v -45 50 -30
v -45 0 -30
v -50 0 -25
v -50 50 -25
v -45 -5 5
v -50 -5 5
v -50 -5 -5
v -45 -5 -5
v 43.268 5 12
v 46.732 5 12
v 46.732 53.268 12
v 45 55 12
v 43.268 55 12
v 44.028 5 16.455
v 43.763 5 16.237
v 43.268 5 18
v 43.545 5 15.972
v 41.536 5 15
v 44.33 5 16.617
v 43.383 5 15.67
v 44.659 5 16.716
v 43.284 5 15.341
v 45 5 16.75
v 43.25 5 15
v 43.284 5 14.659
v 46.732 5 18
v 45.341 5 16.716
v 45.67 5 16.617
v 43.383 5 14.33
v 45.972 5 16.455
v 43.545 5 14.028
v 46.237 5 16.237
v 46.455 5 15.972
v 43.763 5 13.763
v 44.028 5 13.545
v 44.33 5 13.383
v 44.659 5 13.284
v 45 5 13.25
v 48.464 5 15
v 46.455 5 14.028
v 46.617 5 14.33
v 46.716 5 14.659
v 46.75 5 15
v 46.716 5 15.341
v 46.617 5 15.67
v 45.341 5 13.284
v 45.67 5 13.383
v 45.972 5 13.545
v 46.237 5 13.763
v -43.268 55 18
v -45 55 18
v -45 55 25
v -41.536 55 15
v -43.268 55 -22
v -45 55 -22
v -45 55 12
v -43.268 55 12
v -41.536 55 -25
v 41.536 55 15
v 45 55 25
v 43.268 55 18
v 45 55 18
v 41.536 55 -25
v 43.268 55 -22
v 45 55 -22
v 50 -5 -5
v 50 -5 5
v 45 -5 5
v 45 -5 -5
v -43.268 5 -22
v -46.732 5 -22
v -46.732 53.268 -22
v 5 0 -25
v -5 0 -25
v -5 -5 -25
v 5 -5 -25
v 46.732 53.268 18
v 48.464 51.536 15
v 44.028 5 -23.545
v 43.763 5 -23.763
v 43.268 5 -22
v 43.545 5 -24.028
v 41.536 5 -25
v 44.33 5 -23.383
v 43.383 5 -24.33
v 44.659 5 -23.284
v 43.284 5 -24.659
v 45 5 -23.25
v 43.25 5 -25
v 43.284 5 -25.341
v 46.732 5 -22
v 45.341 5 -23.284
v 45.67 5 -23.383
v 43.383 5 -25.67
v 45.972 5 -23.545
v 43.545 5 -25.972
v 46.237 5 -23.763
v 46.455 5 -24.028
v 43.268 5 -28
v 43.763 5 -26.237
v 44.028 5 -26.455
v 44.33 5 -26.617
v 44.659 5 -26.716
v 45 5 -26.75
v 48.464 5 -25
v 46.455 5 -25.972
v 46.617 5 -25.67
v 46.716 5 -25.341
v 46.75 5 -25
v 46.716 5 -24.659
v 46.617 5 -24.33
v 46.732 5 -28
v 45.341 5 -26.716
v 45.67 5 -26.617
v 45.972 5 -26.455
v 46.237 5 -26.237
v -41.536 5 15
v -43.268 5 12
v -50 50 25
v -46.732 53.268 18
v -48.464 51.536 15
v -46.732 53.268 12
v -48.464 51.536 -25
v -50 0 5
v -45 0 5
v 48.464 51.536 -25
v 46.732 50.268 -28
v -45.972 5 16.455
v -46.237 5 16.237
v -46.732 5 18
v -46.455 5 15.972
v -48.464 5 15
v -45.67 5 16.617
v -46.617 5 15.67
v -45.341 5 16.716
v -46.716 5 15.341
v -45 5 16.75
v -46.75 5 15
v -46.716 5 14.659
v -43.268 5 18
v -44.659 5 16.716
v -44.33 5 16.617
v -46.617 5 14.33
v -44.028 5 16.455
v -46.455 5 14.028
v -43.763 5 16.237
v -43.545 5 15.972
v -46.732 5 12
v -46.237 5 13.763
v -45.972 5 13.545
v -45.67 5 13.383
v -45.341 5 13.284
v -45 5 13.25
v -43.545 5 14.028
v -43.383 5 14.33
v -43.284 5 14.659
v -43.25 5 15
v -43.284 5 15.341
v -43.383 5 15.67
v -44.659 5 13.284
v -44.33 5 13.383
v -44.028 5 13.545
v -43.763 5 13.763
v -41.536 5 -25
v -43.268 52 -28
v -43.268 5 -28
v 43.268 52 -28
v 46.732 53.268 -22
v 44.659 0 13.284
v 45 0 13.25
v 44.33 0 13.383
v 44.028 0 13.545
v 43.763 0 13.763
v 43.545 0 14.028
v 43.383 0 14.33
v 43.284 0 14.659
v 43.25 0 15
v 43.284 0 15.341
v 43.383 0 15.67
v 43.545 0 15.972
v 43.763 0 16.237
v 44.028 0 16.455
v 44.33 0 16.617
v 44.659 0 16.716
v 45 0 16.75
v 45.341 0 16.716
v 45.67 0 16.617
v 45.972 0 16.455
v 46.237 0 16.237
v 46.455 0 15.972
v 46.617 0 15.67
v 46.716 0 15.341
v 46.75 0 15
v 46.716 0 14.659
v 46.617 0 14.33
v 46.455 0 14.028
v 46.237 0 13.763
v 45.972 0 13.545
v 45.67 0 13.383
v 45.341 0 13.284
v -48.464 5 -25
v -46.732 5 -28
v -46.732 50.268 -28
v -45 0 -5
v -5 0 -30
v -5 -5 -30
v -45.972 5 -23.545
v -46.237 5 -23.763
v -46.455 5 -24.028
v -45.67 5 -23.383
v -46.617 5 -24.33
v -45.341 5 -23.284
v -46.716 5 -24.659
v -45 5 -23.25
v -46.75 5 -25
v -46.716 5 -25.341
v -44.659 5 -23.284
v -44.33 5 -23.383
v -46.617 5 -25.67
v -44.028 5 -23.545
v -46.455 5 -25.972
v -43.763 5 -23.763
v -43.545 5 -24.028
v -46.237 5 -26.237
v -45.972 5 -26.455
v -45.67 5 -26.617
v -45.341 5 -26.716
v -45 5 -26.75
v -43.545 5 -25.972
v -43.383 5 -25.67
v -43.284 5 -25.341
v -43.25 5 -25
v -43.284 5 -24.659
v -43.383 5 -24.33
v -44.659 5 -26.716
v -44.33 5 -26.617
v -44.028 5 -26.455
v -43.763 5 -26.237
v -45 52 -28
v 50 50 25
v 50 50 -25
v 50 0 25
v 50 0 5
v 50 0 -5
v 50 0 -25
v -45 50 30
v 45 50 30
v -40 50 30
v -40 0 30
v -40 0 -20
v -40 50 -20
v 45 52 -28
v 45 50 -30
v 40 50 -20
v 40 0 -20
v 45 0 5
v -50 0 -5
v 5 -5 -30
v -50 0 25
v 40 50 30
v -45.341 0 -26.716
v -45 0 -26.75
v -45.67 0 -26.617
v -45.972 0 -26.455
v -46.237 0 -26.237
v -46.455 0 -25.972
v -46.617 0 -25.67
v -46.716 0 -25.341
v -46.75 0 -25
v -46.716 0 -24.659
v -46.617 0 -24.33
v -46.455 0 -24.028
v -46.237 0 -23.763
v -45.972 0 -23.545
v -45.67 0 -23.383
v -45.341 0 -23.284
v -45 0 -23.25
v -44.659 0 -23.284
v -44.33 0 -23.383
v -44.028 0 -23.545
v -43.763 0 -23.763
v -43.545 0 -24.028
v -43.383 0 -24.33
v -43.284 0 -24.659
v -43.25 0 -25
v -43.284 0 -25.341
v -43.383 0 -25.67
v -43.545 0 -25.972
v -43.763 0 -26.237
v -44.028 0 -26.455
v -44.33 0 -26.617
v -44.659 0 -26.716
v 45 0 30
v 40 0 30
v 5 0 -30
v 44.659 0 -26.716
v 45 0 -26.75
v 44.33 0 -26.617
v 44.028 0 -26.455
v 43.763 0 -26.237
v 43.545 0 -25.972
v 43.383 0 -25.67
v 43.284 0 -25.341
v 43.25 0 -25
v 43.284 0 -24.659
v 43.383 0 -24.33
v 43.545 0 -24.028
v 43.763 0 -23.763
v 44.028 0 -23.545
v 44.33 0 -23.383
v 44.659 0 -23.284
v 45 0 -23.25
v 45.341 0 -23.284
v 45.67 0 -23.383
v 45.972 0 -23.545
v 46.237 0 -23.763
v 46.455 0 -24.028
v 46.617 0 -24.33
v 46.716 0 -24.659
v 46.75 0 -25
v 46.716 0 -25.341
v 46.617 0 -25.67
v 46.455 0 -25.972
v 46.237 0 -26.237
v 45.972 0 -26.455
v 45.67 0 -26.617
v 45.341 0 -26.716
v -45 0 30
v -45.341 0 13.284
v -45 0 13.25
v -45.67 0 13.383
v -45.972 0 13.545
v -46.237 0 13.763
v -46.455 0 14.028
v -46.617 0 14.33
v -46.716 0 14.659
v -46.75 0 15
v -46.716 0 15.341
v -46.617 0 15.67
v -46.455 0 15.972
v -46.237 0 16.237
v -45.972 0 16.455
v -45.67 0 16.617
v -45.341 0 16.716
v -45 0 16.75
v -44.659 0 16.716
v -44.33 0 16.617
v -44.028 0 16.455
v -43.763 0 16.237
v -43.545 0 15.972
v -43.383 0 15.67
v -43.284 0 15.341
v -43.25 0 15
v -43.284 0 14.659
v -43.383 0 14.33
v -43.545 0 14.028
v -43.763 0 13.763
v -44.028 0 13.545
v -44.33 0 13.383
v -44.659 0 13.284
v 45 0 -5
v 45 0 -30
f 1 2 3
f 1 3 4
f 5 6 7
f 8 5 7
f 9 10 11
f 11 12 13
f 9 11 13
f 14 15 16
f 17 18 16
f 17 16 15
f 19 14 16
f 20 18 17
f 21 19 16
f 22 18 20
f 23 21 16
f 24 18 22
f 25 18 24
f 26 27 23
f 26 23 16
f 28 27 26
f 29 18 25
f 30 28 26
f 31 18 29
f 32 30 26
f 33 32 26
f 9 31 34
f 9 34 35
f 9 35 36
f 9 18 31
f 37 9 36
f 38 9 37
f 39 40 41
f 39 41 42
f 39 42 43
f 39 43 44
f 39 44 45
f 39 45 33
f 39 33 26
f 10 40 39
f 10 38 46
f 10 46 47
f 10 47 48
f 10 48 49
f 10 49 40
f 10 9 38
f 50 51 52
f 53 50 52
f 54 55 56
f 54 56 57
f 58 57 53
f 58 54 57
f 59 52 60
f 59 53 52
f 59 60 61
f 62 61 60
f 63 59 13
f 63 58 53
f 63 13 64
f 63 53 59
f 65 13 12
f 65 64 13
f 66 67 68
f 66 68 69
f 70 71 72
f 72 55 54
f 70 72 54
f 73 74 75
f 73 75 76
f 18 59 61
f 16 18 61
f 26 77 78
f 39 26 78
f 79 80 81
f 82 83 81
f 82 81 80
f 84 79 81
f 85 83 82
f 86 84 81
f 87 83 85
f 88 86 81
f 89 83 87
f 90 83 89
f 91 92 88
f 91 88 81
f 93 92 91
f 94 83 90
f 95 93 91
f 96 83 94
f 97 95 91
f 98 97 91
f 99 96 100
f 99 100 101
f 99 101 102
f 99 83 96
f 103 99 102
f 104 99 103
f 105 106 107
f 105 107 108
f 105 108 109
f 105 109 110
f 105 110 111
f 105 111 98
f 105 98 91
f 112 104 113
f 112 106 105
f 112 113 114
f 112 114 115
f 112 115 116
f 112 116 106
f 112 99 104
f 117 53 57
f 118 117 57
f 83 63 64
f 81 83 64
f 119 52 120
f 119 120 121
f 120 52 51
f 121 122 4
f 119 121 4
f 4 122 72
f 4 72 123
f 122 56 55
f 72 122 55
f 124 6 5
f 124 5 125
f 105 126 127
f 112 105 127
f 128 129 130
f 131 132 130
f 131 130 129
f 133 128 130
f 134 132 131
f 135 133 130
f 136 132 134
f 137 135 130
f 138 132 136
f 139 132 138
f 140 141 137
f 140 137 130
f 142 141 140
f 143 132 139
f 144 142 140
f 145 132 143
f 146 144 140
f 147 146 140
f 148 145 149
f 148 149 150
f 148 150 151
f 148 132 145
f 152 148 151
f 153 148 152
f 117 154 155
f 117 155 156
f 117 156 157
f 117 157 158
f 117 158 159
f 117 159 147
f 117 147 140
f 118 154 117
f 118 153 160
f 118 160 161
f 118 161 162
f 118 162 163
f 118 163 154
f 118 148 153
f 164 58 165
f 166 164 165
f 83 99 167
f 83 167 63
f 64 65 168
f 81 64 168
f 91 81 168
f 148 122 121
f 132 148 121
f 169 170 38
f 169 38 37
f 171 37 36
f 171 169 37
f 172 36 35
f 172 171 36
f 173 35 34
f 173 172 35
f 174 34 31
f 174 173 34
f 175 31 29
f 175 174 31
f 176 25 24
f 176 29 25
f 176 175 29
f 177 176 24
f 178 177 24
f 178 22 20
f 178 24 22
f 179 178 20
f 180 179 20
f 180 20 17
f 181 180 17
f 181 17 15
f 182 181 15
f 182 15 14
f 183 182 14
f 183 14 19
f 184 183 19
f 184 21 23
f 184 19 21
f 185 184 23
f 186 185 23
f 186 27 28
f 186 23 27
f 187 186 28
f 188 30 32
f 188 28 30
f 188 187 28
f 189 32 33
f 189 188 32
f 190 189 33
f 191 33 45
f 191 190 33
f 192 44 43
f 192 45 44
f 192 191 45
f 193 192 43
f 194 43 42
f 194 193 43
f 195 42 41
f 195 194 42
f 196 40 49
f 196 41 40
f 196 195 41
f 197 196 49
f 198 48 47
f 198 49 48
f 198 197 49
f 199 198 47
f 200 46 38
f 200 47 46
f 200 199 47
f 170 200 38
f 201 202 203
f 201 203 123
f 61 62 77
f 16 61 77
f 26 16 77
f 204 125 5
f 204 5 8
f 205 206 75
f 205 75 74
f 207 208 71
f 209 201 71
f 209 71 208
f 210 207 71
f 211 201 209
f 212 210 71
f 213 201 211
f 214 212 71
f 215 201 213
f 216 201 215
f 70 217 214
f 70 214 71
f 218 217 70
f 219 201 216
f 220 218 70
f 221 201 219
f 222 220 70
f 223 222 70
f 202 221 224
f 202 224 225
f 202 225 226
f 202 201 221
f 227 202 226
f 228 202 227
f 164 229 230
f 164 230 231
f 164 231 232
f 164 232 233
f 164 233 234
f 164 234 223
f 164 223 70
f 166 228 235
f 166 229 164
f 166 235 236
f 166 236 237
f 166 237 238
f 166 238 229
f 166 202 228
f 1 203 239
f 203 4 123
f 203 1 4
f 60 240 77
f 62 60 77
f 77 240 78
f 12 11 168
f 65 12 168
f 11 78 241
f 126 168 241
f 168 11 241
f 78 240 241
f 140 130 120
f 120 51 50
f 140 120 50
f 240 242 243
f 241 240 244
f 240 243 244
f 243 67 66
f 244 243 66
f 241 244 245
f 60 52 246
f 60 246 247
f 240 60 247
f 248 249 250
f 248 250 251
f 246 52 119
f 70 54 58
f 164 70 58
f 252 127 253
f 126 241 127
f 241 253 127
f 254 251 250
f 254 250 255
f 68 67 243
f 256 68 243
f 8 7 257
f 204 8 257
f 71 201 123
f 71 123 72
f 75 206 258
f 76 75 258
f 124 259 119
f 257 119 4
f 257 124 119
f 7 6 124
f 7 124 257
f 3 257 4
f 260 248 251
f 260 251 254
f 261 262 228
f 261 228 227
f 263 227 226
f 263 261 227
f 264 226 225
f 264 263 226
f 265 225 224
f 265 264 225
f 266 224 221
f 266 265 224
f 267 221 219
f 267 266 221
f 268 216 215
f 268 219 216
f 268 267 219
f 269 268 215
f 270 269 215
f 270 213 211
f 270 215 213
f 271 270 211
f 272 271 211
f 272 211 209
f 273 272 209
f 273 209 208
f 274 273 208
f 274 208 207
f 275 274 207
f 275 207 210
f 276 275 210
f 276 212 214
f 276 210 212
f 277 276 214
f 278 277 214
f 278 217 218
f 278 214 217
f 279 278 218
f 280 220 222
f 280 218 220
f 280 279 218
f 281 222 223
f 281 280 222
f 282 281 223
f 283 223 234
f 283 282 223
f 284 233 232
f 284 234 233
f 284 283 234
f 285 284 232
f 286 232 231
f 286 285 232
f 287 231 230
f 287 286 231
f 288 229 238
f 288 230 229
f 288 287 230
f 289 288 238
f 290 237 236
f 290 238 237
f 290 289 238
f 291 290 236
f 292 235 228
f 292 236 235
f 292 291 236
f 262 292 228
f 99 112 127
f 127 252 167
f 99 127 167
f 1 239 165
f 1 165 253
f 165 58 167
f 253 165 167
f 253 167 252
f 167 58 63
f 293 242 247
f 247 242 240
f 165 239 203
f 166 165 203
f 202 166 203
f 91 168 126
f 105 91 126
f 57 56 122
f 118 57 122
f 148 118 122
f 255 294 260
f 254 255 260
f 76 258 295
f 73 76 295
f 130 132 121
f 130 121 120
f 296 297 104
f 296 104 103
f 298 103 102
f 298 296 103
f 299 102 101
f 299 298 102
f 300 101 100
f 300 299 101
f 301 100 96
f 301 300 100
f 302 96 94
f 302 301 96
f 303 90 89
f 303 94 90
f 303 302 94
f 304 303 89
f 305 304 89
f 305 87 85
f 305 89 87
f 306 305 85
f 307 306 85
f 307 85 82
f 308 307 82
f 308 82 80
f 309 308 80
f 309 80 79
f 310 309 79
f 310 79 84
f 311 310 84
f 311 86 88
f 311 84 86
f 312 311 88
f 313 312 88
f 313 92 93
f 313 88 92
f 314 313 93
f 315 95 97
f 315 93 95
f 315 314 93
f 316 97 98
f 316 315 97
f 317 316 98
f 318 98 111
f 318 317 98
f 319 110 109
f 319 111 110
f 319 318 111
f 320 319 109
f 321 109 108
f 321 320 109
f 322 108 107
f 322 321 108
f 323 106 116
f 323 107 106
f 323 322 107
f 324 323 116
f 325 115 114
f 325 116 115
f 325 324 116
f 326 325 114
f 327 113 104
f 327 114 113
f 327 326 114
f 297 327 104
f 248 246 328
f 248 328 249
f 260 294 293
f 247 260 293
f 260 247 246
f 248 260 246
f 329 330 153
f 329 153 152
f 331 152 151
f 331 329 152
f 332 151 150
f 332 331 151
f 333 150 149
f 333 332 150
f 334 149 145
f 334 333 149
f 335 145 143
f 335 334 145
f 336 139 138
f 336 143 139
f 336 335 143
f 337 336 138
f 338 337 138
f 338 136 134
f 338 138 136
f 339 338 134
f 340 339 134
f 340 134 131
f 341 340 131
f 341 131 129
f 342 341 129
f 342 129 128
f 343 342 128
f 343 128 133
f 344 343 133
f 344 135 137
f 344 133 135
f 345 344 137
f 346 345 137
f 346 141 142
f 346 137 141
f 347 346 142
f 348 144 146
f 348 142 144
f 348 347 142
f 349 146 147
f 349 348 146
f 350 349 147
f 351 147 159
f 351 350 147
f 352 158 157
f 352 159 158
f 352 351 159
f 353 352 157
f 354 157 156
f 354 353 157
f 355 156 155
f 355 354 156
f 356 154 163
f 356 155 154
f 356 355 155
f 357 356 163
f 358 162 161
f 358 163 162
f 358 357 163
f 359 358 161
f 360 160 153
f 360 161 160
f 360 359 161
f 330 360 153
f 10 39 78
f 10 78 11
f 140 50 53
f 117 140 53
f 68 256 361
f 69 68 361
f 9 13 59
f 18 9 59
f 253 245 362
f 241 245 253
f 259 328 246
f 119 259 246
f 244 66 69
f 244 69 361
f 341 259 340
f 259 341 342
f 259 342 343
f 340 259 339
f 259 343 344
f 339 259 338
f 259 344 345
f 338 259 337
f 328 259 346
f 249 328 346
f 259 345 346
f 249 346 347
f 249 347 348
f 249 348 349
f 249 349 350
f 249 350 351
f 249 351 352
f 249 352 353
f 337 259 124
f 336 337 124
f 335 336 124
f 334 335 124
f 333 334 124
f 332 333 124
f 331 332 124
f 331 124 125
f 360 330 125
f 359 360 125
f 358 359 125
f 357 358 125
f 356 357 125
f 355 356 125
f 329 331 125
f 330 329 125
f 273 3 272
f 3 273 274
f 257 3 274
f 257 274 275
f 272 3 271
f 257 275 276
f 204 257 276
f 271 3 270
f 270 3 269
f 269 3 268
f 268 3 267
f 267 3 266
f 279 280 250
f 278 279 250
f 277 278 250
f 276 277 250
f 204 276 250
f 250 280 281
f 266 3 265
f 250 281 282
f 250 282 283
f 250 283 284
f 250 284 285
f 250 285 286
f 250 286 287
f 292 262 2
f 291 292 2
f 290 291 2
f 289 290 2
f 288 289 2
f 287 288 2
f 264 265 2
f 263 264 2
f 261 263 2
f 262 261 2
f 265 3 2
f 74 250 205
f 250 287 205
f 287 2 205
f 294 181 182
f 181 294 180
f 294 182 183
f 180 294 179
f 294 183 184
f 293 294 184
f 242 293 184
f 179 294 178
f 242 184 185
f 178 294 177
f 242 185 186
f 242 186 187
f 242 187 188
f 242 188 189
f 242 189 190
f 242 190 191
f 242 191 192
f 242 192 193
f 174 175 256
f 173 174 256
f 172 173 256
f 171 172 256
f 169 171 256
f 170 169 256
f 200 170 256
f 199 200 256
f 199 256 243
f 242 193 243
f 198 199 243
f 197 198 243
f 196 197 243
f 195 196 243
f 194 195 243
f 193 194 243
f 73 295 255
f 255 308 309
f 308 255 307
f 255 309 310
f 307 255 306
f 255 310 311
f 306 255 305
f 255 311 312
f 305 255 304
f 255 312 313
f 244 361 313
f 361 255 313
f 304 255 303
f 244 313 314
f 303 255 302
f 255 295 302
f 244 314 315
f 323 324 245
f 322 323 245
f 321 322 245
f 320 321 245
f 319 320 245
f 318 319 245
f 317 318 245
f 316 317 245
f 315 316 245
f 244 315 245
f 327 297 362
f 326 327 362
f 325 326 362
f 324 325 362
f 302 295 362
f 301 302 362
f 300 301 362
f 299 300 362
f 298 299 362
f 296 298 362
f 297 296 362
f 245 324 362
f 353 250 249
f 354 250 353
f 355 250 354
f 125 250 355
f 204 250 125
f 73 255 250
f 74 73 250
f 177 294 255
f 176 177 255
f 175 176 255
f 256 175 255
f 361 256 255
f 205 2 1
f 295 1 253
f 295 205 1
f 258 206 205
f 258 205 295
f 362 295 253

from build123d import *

# Parameters (mm, degrees)
SKETCH1_W               = 100
SKETCH1_H               = 60
BOSS_EXTRUDE1_DEPTH     = 55
CUT_EXTRUDE1_START      = 30
SKETCH2_W               = 80
SKETCH2_H               = 50
CUT_EXTRUDE1_DEPTH      = 50
CHAMFER2_SIZE           = 5
CUT_EXTRUDE2_DEPTH      = 81.156097709
CUT_EXTRUDE2_DEPTH_BACK = 81.156097709
SKETCH3_R               = 1.75
CUT_EXTRUDE3_START      = 55
CUT_EXTRUDE3_DEPTH      = 50
BOSS_EXTRUDE2_START     = -50
SKETCH5_W               = 10
SKETCH5_H               = 5
BOSS_EXTRUDE2_DEPTH     = 5
BOSS_EXTRUDE3_START     = 50
SKETCH5_2_W             = 10
SKETCH5_2_H             = 5
BOSS_EXTRUDE3_DEPTH     = 5
BOSS_EXTRUDE4_START     = -30
SKETCH7_W               = 10
SKETCH7_H               = 5
BOSS_EXTRUDE4_DEPTH     = 5


with BuildPart() as part:
    # Sketch1 → Boss-Extrude1 (new body)
    with BuildSketch(Plane(origin=(0, 0, 0), x_dir=(1, 0, 0), z_dir=(0, 1, 0))):
        Rectangle(SKETCH1_W, SKETCH1_H)
    extrude(amount=BOSS_EXTRUDE1_DEPTH)

    # Sketch2 → Cut-Extrude1 (cut)
    with BuildSketch(Plane.XY.offset(CUT_EXTRUDE1_START)):
        with Locations((0, 25)):
            Rectangle(SKETCH2_W, SKETCH2_H)
    extrude(amount=-CUT_EXTRUDE1_DEPTH, mode=Mode.SUBTRACT)

    # Chamfer2
    chamfer2_edges = [part.edges().sort_by_distance(p)[0] for p in [
        (-50, 55, 0),
        (0, 55, 30),
        (50, 55, 0),
        (50, 27.5, 30),
        (-50, 27.5, 30),
        (-50, 27.5, -30),
        (50, 27.5, -30),
        (0, 55, -30),
    ]]
    chamfer(chamfer2_edges, length=CHAMFER2_SIZE - 0.0001)  # a hair under: the kernel refuses the full size

    # Sketch3 → Cut-Extrude2 (cut, two sides: drawn at the far end of the back side and taken through both)
    with BuildSketch(Plane(origin=(0, 0, 0), x_dir=(1, 0, 0), z_dir=(0, 1, 0)).offset(-CUT_EXTRUDE2_DEPTH_BACK)):
        with Locations(Location((-45, 25, 0), (0, 0, 90))):
            Circle(SKETCH3_R)
        with Locations(Location((45, 25, 0), (0, 0, 90))):
            Circle(SKETCH3_R)
        with Locations(Location((45, -15, 0), (0, 0, 90))):
            Circle(SKETCH3_R)
        with Locations(Location((-45, -15, 0), (0, 0, 90))):
            Circle(SKETCH3_R)
    extrude(amount=CUT_EXTRUDE2_DEPTH + CUT_EXTRUDE2_DEPTH_BACK, mode=Mode.SUBTRACT)

    # Sketch4 → Cut-Extrude3 (cut)
    with BuildSketch(Plane(origin=(0, 0, 0), x_dir=(1, 0, 0), z_dir=(0, 1, 0)).offset(CUT_EXTRUDE3_START)):
        Polygon((-41.535898385, 25), (-43.267949192, 28), (-46.732050808, 28), (-48.464101615, 25), (-46.732050808, 22), (-43.267949192, 22), align=None)
        Polygon((-41.535898385, -15), (-43.267949192, -12), (-46.732050808, -12), (-48.464101615, -15), (-46.732050808, -18), (-43.267949192, -18), align=None)
        Polygon((48.464101615, 25), (46.732050808, 28), (43.267949192, 28), (41.535898385, 25), (43.267949192, 22), (46.732050808, 22), align=None)
        Polygon((48.464101615, -15), (46.732050808, -12), (43.267949192, -12), (41.535898385, -15), (43.267949192, -18), (46.732050808, -18), align=None)
    extrude(amount=-CUT_EXTRUDE3_DEPTH, mode=Mode.SUBTRACT)

    # Sketch5 → Boss-Extrude2 (add)
    with BuildSketch(Plane(origin=(0, 0, 0), x_dir=(0, 0, -1), z_dir=(1, 0, 0)).offset(BOSS_EXTRUDE2_START)):
        with Locations((0, -2.5)):
            Rectangle(SKETCH5_W, SKETCH5_H)
    extrude(amount=BOSS_EXTRUDE2_DEPTH)

    # Sketch5<2> → Boss-Extrude3 (add)
    with BuildSketch(Plane(origin=(0, 0, 0), x_dir=(0, 0, -1), z_dir=(1, 0, 0)).offset(BOSS_EXTRUDE3_START)):
        with Locations((0, -2.5)):
            Rectangle(SKETCH5_2_W, SKETCH5_2_H)
    extrude(amount=-BOSS_EXTRUDE3_DEPTH)

    # Sketch7 → Boss-Extrude4 (add)
    with BuildSketch(Plane.XY.offset(BOSS_EXTRUDE4_START)):
        with Locations((0, -2.5)):
            Rectangle(SKETCH7_W, SKETCH7_H)
    extrude(amount=BOSS_EXTRUDE4_DEPTH)


solid = part.part
